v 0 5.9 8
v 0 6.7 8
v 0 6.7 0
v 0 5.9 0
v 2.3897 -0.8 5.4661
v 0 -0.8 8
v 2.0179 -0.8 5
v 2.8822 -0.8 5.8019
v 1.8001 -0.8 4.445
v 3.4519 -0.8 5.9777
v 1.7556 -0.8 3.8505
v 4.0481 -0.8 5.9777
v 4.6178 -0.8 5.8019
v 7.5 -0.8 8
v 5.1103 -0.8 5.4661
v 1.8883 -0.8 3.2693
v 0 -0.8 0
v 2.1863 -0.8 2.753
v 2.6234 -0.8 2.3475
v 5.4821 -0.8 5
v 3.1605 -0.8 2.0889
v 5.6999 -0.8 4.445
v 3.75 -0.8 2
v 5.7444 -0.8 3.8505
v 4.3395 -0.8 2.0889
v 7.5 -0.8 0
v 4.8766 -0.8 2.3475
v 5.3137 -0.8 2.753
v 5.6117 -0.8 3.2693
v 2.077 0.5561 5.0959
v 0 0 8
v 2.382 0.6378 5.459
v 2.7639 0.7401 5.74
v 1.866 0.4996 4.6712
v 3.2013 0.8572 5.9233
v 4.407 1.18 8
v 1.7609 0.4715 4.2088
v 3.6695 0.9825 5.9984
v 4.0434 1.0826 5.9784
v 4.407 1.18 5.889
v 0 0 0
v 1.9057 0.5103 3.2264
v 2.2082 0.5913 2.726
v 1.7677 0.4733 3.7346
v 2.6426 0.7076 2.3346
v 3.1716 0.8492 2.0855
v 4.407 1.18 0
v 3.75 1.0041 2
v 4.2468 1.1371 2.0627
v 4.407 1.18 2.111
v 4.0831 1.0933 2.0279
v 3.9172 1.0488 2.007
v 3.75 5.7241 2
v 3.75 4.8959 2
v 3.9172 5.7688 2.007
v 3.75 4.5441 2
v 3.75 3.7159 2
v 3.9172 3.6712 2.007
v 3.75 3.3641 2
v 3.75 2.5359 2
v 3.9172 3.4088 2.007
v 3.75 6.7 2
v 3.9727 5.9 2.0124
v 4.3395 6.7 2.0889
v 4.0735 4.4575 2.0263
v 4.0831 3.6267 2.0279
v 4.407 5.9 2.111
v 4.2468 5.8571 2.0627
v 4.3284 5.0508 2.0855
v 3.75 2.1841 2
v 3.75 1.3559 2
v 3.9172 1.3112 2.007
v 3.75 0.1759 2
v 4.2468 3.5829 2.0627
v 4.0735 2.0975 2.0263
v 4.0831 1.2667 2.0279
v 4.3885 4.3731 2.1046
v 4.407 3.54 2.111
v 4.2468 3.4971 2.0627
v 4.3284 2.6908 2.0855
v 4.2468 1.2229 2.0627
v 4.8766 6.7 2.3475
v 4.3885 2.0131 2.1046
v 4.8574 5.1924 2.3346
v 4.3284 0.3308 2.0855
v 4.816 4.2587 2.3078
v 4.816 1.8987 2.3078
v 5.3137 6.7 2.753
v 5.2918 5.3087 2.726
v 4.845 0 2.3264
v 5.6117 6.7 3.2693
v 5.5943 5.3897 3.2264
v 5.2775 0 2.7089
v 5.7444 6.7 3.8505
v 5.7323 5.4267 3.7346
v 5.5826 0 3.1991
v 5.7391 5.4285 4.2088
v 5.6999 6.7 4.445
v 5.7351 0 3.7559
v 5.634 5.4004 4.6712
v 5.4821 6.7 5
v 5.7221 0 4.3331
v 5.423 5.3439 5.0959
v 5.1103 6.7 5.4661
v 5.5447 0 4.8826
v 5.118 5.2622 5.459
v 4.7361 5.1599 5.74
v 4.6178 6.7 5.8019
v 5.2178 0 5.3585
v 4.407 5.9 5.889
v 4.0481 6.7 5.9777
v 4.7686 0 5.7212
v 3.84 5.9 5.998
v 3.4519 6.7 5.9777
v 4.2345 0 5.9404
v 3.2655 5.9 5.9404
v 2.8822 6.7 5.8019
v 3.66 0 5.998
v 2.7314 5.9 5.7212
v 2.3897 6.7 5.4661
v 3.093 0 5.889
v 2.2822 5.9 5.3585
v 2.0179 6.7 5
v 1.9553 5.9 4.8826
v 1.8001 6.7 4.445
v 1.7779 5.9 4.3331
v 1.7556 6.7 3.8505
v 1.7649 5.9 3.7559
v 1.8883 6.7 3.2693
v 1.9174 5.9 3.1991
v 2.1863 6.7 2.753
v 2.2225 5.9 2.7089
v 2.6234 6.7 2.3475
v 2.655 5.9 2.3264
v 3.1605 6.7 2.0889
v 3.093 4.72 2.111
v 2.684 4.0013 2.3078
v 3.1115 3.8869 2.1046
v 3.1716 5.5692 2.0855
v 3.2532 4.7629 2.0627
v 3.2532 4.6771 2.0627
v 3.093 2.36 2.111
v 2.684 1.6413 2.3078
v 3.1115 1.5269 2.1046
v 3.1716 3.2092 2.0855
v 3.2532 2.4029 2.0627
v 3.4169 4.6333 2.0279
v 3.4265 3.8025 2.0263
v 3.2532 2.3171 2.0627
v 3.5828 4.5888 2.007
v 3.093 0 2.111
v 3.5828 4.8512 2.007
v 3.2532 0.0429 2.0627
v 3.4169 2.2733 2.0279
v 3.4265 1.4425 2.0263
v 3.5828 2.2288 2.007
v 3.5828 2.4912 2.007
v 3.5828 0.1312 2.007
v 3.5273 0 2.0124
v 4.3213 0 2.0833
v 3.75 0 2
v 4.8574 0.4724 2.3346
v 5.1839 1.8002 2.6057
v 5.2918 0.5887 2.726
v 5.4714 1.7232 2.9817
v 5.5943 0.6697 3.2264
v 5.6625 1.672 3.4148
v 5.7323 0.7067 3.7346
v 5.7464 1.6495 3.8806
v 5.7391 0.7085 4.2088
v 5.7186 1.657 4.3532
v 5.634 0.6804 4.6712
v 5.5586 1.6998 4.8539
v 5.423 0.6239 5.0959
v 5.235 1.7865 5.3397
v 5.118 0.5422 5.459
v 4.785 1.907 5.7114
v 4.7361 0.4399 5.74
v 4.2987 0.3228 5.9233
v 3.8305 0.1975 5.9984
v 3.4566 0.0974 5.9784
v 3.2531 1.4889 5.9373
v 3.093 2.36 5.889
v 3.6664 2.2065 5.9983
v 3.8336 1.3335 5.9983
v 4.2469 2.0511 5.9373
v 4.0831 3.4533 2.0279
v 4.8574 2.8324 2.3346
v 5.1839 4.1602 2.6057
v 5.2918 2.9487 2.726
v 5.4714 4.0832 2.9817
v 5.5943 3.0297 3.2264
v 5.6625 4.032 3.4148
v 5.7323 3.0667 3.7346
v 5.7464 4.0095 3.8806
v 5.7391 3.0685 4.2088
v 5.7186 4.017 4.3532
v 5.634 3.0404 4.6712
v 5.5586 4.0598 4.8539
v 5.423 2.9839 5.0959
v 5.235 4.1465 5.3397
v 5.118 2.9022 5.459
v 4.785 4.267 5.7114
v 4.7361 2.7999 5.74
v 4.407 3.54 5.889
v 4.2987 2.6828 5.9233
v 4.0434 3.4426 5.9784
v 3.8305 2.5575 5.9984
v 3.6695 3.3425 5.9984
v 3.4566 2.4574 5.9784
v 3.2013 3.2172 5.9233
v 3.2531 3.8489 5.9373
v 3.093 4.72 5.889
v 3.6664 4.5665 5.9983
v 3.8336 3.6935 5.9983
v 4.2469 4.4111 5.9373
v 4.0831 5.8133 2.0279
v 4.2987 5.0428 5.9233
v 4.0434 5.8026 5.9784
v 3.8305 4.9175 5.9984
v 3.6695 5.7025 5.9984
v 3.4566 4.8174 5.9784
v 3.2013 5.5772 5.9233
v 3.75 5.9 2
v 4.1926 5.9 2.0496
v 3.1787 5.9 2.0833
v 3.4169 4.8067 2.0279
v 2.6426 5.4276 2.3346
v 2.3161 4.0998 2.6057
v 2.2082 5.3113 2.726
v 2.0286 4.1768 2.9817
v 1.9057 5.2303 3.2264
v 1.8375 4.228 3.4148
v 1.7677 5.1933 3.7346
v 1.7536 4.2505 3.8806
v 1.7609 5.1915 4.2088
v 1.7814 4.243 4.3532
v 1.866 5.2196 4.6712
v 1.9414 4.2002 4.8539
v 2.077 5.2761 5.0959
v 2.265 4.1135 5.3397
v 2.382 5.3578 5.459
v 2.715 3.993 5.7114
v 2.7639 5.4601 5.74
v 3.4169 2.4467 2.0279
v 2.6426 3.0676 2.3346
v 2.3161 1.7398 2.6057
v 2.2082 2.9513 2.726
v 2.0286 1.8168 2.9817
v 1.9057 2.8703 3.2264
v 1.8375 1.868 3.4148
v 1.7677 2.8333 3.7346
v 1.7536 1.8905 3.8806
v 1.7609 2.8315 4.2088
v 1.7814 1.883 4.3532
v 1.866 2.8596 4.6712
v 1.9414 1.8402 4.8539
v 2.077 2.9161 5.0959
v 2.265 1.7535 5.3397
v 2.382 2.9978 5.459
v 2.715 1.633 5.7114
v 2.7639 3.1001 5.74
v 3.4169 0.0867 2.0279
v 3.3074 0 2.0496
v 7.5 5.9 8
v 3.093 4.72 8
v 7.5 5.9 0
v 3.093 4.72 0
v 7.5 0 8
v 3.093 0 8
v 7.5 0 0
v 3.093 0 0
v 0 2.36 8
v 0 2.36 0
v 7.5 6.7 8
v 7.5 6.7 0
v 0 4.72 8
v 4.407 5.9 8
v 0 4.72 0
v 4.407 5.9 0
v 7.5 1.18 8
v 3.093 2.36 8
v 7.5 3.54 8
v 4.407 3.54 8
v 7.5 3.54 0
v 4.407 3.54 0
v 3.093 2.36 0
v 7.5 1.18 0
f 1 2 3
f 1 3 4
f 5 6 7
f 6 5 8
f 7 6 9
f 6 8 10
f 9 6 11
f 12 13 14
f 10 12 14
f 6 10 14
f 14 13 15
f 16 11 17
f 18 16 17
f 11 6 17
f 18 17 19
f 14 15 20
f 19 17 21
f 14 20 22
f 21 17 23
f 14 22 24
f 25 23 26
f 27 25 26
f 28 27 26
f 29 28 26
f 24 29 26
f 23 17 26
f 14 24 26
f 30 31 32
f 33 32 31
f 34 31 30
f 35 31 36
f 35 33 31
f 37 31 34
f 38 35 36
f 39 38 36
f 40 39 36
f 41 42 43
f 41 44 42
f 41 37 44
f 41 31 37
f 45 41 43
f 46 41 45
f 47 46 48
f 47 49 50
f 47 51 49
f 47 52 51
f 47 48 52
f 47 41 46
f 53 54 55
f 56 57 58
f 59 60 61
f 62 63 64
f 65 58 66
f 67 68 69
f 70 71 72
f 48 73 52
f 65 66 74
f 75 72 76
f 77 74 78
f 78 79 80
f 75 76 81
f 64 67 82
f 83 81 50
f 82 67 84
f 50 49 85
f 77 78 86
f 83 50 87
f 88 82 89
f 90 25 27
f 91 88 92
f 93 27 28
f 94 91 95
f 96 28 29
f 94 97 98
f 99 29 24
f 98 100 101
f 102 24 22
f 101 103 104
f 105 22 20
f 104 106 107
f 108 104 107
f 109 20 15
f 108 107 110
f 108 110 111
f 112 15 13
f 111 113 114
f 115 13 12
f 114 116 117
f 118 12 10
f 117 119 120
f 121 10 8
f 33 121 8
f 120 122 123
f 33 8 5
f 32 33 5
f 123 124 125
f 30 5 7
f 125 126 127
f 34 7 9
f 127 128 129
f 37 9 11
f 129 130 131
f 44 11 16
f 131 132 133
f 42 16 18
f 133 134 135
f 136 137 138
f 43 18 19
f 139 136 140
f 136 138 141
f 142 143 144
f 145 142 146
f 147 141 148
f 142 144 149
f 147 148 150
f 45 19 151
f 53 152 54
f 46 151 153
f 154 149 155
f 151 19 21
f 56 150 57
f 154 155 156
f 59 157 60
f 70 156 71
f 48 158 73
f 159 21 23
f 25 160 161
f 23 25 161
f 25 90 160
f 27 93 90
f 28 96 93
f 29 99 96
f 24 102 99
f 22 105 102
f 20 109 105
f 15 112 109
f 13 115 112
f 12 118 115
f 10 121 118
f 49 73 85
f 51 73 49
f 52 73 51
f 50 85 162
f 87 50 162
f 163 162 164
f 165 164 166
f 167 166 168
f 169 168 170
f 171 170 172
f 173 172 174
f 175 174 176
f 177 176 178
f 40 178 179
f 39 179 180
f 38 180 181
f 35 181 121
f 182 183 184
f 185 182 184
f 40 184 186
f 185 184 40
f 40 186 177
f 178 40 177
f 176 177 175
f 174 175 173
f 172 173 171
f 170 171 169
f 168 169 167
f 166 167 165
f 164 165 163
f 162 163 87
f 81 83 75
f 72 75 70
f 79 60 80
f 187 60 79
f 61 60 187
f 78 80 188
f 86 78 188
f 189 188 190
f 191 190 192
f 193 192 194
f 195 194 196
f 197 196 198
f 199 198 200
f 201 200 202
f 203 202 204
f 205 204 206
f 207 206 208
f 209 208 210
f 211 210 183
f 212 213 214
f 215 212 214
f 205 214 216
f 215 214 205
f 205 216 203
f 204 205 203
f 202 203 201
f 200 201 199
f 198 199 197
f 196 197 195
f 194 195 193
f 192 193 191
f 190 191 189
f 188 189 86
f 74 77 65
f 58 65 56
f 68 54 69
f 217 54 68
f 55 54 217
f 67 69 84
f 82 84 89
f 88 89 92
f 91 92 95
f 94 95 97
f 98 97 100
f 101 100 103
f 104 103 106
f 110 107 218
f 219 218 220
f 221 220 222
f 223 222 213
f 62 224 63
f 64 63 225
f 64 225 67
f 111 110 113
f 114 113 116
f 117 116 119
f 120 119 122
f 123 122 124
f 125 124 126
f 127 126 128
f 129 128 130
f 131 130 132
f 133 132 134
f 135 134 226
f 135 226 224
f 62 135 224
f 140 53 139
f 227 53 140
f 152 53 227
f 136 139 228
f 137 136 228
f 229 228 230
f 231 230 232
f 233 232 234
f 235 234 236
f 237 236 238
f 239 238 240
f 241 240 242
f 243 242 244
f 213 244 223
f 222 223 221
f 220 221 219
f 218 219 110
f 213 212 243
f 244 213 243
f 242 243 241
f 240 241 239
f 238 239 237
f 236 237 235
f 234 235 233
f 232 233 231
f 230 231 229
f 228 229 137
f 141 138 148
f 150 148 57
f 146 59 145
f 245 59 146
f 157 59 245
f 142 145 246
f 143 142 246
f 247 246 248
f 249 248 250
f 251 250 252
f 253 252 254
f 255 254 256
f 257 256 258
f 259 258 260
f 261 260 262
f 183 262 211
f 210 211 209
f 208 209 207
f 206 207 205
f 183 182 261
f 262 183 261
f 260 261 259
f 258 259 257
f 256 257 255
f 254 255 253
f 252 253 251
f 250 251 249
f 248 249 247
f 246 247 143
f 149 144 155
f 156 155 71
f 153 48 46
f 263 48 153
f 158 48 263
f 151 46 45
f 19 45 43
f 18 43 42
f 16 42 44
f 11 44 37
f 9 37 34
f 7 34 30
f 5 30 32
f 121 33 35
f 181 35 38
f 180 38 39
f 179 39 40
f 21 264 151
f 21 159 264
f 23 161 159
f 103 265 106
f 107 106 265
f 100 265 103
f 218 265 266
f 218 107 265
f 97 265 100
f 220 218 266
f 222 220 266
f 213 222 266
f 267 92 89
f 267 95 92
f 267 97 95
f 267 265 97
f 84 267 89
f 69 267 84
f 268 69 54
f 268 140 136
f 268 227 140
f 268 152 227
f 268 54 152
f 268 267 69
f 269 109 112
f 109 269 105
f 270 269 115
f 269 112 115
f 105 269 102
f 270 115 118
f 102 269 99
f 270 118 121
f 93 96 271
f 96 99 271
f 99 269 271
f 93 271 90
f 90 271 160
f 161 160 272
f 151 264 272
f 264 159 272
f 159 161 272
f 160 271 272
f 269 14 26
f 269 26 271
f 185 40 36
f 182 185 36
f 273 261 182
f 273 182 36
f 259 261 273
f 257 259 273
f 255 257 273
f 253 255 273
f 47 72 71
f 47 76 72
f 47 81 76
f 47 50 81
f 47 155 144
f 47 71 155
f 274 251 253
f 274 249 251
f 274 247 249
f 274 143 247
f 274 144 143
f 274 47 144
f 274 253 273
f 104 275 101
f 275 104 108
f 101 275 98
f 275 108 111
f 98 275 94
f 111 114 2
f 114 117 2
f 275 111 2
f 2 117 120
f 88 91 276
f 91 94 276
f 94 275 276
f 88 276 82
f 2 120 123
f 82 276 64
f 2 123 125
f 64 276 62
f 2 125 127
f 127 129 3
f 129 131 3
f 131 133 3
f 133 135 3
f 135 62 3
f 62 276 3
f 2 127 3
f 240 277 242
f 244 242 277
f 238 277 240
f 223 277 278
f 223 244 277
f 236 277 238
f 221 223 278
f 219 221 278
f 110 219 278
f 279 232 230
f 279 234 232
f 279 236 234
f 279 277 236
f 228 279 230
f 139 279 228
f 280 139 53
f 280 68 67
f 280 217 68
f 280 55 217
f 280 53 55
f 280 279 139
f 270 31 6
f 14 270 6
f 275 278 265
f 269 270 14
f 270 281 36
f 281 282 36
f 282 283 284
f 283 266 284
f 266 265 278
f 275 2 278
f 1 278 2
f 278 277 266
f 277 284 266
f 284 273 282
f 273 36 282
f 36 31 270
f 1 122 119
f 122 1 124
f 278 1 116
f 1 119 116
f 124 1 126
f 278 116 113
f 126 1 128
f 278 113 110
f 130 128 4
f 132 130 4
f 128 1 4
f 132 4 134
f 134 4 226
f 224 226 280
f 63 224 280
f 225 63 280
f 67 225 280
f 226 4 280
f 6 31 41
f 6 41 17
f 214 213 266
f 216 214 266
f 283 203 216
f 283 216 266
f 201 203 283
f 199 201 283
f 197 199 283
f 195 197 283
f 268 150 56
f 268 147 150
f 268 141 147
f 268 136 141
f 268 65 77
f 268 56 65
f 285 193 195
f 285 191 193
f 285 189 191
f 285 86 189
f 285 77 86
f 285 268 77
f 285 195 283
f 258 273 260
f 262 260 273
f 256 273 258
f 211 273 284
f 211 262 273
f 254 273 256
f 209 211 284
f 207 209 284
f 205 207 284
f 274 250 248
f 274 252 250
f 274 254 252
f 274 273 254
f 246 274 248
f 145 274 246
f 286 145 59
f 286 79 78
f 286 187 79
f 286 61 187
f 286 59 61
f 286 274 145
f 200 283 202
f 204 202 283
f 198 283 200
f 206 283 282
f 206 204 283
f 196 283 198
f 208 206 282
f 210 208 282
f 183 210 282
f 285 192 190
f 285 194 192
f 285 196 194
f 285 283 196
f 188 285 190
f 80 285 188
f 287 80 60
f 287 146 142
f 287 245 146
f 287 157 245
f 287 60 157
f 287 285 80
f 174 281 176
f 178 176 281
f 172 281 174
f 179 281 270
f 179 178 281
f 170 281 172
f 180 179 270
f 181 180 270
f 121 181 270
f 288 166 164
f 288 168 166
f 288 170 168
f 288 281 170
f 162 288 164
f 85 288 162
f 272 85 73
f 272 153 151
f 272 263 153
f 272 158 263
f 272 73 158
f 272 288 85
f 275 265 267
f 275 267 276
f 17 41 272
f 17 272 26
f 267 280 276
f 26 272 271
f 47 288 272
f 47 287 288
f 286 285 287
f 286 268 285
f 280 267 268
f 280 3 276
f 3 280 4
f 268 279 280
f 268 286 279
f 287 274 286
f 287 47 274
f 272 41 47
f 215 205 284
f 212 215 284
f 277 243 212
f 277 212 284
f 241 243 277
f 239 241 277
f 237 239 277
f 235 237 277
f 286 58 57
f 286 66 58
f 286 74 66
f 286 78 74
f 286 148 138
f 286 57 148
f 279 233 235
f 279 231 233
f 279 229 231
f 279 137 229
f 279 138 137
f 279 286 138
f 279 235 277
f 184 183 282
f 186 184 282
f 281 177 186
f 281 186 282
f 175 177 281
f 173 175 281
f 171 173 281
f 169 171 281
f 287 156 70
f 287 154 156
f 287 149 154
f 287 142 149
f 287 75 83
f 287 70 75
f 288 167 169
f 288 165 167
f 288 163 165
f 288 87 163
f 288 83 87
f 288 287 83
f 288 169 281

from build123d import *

# Parameters (mm, degrees)
BOSS_EXTRUDE3_DEPTH = 8
SKETCH4_R           = 2
CUT_EXTRUDE3_DEPTH  = 14.285330256


with BuildPart() as part:
    # Sketch3 → Boss-Extrude3 (new body)
    with BuildSketch(Plane.XY):
        Polygon((7.5, 0), (3.09302731, 0), (0, 0), (0, -0.8), (7.5, -0.8), align=None)
        Polygon((4.40697269, 5.9), (7.5, 5.9), (3.09302731, 4.72), (7.5, 3.54), (3.09302731, 2.36), (7.5, 1.18), (3.09302731, 0), (0, 0), (4.40697269, 1.18), (0, 2.36), (4.40697269, 3.54), (0, 4.72), align=None)
        Polygon((4.40697269, 5.9), (7.5, 5.9), (7.5, 6.7), (0, 6.7), (0, 5.9), align=None)
    extrude(amount=BOSS_EXTRUDE3_DEPTH)

    # Sketch4 → Cut-Extrude3 (cut, through all)
    with BuildSketch(Plane.XZ.offset(0.8)):
        with Locations(Location((3.75, 4, 0), (0, 0, 270))):
            Circle(SKETCH4_R)
    extrude(amount=-CUT_EXTRUDE3_DEPTH, mode=Mode.SUBTRACT)


solid = part.part
